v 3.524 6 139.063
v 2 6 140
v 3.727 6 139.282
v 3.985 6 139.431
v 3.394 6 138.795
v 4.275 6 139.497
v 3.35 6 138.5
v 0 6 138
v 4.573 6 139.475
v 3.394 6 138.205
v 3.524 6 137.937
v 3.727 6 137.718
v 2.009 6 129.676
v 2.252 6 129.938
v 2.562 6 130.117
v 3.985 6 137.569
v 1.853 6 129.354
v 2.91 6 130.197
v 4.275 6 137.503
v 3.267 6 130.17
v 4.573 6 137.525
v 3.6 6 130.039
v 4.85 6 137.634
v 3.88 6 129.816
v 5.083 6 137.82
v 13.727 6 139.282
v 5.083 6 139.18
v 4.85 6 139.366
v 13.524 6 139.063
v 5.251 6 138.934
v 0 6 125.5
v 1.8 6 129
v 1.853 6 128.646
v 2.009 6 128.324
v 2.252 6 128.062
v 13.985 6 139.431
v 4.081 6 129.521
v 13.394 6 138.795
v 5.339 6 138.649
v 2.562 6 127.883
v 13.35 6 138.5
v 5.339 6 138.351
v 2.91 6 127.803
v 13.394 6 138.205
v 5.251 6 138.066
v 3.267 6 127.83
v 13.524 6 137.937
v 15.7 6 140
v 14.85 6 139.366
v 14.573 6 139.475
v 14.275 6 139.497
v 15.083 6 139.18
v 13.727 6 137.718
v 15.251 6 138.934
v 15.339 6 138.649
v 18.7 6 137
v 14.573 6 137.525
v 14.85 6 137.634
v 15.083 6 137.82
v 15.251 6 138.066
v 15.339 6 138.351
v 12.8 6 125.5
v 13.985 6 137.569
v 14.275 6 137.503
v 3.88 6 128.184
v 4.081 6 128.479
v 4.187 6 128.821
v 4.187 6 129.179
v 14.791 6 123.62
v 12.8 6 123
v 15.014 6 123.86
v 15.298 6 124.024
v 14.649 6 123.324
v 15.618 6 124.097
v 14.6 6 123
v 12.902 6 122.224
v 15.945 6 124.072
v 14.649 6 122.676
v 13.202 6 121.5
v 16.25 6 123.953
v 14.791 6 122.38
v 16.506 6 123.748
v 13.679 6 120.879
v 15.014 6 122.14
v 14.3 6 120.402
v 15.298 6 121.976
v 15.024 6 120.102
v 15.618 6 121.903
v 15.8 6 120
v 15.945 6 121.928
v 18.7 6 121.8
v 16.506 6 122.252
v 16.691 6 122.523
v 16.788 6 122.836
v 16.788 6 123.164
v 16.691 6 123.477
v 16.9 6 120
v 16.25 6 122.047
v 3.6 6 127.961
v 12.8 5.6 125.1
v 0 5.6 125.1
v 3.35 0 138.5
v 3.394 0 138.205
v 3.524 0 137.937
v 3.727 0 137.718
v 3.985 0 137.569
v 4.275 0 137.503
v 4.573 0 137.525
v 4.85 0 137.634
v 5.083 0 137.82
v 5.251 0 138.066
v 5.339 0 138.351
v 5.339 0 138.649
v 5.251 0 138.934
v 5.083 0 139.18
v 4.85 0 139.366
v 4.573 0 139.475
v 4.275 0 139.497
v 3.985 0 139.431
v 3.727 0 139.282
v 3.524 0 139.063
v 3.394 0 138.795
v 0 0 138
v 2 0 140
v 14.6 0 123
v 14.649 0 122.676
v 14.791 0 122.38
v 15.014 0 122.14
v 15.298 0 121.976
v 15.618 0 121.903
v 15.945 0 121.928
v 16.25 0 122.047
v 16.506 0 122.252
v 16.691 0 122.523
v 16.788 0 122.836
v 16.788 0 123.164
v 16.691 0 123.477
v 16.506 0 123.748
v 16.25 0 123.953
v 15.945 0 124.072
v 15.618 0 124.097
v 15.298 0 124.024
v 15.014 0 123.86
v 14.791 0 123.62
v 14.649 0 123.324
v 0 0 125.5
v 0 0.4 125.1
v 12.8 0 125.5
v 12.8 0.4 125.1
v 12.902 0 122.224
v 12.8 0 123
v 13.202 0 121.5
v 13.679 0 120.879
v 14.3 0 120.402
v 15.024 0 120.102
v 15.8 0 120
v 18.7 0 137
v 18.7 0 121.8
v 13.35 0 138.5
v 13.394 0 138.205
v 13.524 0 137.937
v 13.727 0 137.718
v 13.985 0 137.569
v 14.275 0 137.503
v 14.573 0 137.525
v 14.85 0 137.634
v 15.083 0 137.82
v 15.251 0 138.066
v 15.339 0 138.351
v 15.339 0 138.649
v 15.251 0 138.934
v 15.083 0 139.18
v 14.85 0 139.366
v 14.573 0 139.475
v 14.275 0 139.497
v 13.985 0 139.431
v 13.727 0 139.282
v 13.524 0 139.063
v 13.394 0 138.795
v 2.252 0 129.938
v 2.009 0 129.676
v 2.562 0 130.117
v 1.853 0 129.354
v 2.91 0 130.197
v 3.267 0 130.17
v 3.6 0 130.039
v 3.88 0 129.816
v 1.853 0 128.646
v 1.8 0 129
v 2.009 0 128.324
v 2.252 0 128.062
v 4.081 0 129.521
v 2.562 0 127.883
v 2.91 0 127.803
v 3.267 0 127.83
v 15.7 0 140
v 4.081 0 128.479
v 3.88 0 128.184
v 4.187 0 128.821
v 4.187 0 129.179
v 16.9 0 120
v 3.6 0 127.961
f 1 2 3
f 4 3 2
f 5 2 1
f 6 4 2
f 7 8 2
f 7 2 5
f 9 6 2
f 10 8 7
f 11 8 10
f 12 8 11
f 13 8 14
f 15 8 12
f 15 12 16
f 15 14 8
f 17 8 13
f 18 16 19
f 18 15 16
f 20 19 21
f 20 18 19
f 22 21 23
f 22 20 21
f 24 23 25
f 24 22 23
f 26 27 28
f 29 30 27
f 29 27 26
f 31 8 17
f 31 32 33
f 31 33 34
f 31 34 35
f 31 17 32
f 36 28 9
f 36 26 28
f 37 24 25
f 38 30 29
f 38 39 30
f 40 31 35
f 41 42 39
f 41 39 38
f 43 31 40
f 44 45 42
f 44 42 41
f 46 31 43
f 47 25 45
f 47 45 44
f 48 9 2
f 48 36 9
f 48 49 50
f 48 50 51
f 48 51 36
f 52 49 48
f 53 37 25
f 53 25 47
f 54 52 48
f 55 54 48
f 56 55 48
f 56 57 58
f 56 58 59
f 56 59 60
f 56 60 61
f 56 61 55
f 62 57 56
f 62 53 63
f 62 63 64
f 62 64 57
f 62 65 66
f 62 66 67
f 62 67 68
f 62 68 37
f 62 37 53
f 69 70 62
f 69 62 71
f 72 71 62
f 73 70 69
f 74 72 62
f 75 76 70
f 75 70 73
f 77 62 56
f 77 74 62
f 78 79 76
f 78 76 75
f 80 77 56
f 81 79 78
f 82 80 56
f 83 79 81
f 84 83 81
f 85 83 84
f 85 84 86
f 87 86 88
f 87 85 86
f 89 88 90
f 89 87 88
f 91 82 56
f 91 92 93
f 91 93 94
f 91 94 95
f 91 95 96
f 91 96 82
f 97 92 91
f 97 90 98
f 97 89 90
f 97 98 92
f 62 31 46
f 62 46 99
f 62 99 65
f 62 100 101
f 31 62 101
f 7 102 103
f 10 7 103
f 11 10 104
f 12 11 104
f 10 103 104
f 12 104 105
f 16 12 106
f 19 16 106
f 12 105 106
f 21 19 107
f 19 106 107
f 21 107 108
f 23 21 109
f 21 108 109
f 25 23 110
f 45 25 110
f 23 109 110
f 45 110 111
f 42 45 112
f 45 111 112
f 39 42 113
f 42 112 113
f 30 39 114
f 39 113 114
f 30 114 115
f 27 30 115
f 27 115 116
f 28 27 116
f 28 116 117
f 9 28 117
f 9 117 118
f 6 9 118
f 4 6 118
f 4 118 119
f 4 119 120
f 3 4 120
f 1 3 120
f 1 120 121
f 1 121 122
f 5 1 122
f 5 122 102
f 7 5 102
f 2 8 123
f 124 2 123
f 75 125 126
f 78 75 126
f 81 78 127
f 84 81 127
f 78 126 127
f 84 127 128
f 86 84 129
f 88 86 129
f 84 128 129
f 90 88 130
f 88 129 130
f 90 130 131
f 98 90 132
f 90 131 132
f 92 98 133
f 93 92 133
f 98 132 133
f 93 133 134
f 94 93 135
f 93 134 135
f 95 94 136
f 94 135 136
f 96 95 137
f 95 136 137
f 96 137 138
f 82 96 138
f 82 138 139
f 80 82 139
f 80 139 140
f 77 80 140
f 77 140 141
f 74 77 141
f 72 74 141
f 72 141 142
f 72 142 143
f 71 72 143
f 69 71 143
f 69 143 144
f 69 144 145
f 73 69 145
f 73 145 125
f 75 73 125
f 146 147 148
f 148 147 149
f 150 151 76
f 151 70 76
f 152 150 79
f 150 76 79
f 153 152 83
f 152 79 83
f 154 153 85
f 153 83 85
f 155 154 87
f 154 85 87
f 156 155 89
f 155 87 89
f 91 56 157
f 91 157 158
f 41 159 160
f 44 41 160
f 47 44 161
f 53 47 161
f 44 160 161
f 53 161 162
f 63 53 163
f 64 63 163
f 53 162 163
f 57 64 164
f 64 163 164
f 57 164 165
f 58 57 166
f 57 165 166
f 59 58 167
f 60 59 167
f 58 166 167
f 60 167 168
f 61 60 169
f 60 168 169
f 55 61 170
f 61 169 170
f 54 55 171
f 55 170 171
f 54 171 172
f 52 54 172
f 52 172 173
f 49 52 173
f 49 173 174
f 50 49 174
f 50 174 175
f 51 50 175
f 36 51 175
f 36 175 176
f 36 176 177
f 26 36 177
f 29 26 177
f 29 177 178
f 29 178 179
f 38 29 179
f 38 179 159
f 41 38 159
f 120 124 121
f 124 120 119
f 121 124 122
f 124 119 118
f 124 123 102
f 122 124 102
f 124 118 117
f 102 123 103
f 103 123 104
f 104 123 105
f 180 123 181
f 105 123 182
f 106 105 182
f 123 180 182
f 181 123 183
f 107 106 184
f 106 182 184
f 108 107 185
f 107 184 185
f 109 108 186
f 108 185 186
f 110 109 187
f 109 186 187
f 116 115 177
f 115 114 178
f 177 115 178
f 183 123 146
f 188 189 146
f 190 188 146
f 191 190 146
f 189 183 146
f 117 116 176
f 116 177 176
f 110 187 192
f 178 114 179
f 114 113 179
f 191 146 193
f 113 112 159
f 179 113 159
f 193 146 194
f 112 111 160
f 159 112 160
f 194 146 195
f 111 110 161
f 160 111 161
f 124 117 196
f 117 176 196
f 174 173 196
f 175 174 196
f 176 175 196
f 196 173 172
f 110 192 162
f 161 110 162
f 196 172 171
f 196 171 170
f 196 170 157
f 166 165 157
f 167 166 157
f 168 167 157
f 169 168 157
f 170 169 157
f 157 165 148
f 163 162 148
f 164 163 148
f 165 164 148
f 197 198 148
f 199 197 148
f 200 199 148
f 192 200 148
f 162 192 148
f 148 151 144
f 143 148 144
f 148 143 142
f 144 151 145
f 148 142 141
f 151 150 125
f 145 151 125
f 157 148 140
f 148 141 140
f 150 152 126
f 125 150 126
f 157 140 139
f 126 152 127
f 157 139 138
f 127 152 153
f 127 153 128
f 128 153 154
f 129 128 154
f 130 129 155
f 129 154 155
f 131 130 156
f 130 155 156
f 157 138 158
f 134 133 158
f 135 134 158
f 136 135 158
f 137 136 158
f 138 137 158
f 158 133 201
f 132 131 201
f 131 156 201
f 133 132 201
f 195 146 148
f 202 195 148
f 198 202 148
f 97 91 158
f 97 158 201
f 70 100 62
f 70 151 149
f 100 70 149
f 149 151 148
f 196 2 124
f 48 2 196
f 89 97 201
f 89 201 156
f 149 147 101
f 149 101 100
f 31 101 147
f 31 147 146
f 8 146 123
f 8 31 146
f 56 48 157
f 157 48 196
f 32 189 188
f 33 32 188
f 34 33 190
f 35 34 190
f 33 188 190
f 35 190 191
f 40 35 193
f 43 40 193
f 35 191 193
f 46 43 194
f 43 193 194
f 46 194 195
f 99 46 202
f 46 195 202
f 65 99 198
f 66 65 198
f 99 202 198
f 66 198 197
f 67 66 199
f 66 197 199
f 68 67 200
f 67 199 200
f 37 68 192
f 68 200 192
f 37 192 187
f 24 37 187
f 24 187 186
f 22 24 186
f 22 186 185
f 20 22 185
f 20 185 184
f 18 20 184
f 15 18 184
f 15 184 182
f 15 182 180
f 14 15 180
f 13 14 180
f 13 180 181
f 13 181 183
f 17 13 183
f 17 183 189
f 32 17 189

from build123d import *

# Parameters (mm, degrees)
BOSS_EXTRUDE1_DEPTH   = 6
SKETCH2_W             = 12.8
SKETCH2_H             = 5.1
CUT_EXTRUDE1_DEPTH    = 142.370753694
F_1_CLEARANCE_HOLE1_D = 2
F_2_CLEARANCE_HOLE1_D = 2.4
F_1_CLEARANCE_HOLE2_D = 2.2
CHAMFER1_SIZE         = 0.4
CHAMFER2_SIZE         = 3
CHAMFER3_SIZE         = 2
FILLET1_R             = 3


with BuildPart() as part:
    # Sketch1 → Boss-Extrude1 (new body)
    with BuildSketch(Plane(origin=(0, 6, 0), x_dir=(1, 0, 0), z_dir=(0, 1, 0))):
        Polygon((16.9, -120), (0, -120), (0, -140), (18.7, -140), (18.7, -121.8), align=None)
    extrude(amount=-BOSS_EXTRUDE1_DEPTH)

    # Sketch2 → Cut-Extrude1 (cut, through all)
    with BuildSketch(Plane.XZ):
        with Locations((6.4, 122.55)):
            Rectangle(SKETCH2_W, SKETCH2_H)
    extrude(amount=-CUT_EXTRUDE1_DEPTH, mode=Mode.SUBTRACT)

    # #1 Clearance Hole1 (through all)
    with Locations(Plane(origin=(0, 6, 0), x_dir=(1, 0, 0), z_dir=(0, 1, 0))):
        with Locations((14.35, -138.5), (4.35, -138.5)):
            Hole(F_1_CLEARANCE_HOLE1_D / 2)

    # #2 Clearance Hole1 (through all)
    with Locations(Plane(origin=(0, 6, 0), x_dir=(1, 0, 0), z_dir=(0, 1, 0))):
        with Locations((3, -129)):
            Hole(F_2_CLEARANCE_HOLE1_D / 2)

    # #1 Clearance Hole2 (through all)
    with Locations(Plane(origin=(0, 6, 0), x_dir=(1, 0, 0), z_dir=(0, 1, 0))):
        with Locations((15.7, -123)):
            Hole(F_1_CLEARANCE_HOLE2_D / 2)

    # Chamfer1
    chamfer1_edges = [part.edges().sort_by_distance(p)[0] for p in [
        (6.4, 6, 125.1),
        (6.4, 0, 125.1),
    ]]
    chamfer(chamfer1_edges, length=CHAMFER1_SIZE)

    # Chamfer2
    chamfer2_edges = [part.edges().sort_by_distance(p)[0] for p in [
        (18.7, 3, 140),
    ]]
    chamfer(chamfer2_edges, length=CHAMFER2_SIZE)

    # Chamfer3
    chamfer3_edges = [part.edges().sort_by_distance(p)[0] for p in [
        (0, 3, 140),
    ]]
    chamfer(chamfer3_edges, length=CHAMFER3_SIZE)

    # Fillet1
    fillet1_edges = [part.edges().sort_by_distance(p)[0] for p in [
        (12.8, 3, 120),
    ]]
    fillet(fillet1_edges, radius=FILLET1_R)


solid = part.part
